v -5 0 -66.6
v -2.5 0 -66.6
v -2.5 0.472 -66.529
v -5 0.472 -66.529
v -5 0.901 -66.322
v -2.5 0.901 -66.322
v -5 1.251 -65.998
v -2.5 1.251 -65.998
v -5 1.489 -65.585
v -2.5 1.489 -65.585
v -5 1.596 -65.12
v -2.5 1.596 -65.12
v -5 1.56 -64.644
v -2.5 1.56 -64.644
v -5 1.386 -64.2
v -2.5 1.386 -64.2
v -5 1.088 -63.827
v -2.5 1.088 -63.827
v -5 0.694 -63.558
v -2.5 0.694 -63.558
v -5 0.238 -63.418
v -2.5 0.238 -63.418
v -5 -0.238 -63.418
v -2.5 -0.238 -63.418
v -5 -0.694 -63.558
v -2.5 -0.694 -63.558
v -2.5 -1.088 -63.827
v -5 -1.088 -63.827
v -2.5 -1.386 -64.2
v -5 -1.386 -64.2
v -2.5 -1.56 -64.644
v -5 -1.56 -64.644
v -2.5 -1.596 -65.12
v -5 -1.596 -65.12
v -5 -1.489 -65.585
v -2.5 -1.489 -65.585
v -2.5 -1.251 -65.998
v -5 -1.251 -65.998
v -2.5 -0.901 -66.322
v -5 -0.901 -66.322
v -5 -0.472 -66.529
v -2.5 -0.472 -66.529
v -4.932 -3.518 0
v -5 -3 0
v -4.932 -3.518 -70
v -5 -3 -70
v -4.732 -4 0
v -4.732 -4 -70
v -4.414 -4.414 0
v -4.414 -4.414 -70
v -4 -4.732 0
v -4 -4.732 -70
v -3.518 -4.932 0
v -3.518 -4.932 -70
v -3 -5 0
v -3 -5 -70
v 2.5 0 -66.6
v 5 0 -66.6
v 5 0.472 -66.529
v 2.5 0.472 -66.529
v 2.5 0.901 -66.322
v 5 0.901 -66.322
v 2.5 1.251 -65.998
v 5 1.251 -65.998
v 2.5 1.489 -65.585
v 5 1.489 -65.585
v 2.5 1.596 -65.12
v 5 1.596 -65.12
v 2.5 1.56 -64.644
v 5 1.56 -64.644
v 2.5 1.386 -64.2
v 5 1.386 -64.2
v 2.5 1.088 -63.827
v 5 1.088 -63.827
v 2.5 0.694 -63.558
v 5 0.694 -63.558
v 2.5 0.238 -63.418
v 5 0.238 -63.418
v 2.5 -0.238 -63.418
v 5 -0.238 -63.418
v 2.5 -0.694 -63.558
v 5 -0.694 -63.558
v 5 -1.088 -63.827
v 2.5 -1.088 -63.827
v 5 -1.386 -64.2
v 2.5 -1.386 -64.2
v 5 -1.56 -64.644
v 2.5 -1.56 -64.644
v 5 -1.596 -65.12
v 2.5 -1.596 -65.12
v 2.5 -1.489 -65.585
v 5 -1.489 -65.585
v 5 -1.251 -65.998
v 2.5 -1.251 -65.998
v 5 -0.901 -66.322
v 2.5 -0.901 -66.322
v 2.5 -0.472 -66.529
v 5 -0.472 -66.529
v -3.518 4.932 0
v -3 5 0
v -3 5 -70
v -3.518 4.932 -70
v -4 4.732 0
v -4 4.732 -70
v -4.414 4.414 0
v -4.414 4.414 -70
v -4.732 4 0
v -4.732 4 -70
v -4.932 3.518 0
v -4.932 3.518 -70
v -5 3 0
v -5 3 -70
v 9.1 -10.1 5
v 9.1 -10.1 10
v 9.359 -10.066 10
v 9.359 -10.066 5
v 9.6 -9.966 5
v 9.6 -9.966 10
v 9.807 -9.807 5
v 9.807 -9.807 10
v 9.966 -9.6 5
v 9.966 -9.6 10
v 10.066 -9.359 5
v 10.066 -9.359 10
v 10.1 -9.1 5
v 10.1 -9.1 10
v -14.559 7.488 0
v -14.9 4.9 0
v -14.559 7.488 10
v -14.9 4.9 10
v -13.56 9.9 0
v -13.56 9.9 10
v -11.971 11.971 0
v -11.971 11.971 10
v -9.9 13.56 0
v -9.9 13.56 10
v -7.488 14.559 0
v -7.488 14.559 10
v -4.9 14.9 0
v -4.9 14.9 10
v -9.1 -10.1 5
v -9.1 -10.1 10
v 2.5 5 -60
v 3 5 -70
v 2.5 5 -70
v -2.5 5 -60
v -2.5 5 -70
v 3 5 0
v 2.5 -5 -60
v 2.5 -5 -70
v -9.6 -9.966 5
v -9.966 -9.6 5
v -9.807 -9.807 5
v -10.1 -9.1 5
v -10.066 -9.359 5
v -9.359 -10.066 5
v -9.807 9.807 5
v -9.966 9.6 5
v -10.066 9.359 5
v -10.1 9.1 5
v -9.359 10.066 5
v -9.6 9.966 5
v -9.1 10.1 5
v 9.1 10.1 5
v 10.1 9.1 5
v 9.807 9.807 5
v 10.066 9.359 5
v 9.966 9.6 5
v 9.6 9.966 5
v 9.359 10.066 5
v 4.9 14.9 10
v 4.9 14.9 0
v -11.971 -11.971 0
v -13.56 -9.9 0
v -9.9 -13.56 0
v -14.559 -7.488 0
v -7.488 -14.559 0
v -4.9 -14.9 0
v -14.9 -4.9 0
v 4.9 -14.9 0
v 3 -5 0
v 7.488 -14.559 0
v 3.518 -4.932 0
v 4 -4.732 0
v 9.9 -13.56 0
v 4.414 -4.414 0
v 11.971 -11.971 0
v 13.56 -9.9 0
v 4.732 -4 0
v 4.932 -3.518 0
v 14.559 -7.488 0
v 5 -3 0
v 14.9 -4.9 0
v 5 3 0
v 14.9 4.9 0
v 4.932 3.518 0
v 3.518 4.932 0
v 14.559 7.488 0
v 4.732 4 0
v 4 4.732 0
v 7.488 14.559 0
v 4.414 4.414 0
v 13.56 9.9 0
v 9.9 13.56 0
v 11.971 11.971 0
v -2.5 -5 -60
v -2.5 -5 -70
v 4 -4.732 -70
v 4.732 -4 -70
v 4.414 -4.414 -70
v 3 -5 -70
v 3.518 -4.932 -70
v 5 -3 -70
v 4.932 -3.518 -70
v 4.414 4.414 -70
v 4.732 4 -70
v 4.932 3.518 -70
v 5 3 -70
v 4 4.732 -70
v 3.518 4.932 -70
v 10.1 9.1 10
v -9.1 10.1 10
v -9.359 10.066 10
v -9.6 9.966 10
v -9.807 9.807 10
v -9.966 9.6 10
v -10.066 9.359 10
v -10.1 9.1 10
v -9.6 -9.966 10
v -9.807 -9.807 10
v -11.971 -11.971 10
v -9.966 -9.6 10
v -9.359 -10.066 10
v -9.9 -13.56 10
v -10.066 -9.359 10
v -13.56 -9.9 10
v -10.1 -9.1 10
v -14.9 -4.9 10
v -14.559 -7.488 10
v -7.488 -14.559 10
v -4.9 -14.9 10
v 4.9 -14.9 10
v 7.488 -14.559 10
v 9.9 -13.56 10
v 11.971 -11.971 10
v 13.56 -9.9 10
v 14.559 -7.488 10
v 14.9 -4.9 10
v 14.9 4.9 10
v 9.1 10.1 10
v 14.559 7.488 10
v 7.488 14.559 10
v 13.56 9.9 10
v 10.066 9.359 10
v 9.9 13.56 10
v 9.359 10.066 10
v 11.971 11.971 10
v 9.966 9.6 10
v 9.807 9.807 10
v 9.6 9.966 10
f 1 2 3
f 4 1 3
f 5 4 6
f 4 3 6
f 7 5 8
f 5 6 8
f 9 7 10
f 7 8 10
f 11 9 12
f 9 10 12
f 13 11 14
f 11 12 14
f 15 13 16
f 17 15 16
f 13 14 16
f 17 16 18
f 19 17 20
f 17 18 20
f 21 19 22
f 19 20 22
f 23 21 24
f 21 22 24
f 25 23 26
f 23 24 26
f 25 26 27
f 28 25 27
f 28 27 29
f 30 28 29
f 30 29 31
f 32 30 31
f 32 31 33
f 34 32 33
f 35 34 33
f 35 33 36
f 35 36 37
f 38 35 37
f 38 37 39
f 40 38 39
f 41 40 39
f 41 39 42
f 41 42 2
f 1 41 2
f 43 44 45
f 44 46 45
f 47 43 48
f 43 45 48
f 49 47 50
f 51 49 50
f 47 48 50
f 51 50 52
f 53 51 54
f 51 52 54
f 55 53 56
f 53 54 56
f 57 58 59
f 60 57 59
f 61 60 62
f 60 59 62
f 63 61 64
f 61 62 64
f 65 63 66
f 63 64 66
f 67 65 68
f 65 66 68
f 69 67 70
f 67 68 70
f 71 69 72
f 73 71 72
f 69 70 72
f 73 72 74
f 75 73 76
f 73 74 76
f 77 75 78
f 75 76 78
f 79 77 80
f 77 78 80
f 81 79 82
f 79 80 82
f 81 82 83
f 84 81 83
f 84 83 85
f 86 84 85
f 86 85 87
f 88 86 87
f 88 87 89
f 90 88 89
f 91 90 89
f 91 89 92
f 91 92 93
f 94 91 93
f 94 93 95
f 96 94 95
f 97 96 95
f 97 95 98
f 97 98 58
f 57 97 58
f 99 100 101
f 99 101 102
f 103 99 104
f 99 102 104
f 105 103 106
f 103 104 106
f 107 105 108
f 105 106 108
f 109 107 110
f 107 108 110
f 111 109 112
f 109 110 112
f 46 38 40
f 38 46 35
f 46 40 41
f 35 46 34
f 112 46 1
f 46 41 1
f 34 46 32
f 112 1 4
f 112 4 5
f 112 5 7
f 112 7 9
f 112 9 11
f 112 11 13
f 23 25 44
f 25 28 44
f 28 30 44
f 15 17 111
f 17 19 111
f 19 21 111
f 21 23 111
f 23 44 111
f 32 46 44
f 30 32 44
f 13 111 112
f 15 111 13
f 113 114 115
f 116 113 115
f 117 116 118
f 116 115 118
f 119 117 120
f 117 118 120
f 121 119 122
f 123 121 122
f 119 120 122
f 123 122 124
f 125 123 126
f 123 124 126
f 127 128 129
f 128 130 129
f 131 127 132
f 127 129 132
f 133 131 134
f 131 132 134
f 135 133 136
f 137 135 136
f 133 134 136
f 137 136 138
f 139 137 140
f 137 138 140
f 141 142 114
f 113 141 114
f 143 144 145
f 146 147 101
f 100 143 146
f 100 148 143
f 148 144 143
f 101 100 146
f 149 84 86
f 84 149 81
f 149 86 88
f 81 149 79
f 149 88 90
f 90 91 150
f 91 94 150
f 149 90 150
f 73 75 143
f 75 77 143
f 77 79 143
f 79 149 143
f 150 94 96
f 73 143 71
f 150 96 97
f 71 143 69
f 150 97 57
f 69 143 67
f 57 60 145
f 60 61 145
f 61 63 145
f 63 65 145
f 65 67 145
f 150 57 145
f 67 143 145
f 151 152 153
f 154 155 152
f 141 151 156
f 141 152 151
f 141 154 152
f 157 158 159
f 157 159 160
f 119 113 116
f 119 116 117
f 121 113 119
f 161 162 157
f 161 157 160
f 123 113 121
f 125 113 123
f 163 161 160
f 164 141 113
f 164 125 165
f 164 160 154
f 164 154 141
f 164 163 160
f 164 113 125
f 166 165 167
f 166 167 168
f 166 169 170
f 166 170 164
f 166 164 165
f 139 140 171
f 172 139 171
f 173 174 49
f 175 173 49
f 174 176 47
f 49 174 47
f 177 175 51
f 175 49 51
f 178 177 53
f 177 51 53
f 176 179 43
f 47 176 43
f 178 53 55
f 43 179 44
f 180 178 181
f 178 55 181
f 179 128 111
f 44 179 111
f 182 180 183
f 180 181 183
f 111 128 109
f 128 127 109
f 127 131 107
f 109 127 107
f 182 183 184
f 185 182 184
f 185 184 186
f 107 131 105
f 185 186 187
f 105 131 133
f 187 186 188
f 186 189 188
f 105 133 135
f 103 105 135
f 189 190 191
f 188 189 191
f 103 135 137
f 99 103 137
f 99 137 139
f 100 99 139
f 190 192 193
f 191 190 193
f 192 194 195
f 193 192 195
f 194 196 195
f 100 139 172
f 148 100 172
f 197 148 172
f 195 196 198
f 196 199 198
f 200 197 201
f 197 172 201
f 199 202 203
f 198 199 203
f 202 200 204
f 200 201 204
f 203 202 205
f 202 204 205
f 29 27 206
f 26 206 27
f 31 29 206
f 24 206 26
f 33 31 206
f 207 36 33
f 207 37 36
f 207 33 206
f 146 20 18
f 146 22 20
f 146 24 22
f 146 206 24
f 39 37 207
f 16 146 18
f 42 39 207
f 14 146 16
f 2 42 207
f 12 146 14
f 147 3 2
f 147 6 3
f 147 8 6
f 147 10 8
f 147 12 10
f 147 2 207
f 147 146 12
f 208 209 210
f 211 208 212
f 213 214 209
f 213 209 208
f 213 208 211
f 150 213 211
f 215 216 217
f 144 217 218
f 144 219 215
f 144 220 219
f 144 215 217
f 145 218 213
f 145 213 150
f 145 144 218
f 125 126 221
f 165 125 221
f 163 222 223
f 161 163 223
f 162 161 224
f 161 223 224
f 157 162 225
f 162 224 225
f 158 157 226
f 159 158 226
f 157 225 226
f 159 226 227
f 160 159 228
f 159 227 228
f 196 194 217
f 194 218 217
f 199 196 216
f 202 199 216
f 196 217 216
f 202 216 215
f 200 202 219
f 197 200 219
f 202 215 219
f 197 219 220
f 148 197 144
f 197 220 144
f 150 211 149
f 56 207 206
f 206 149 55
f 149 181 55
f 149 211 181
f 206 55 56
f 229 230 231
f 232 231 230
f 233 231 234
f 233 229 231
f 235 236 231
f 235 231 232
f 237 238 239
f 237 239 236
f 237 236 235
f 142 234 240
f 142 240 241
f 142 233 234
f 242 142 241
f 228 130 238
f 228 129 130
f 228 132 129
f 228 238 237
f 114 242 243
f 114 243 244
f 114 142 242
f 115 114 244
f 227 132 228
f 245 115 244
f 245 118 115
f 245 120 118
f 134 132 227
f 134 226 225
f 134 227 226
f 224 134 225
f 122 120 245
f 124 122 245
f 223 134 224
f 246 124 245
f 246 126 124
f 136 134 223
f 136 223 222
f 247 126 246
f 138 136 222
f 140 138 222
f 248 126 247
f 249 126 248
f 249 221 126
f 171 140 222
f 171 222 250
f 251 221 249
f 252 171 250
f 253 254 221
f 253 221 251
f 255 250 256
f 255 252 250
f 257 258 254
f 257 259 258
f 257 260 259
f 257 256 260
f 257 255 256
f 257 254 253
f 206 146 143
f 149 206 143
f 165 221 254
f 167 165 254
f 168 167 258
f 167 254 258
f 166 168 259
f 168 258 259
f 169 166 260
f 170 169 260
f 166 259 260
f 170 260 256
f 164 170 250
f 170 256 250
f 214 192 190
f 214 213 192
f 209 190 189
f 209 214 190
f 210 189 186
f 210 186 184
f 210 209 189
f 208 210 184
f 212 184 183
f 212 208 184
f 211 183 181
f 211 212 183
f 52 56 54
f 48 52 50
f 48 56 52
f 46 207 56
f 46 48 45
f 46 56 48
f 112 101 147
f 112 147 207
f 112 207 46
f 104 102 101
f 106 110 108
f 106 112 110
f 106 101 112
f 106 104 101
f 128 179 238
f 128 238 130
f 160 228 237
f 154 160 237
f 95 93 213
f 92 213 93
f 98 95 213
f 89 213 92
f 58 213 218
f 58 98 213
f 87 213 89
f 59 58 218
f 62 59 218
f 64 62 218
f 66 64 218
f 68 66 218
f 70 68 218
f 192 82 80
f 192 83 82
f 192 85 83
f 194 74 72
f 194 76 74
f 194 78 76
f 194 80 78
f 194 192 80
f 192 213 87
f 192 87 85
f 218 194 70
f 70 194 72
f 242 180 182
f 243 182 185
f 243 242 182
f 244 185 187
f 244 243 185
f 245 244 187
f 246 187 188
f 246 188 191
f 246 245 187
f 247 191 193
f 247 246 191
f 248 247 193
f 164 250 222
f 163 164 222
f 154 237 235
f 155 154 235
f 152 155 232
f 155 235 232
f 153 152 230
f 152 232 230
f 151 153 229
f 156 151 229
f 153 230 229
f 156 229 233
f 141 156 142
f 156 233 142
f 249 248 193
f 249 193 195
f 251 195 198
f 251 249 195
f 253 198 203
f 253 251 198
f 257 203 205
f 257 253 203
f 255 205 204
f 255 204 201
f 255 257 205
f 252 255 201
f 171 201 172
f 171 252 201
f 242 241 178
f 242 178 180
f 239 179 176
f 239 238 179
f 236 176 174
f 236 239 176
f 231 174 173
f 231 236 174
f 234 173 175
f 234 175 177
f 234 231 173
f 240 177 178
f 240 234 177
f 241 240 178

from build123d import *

# Parameters (mm, degrees)
SKETCH_1_W          = 29.8
SKETCH_1_H          = 29.8
EXTRUDE_1_DEPTH     = 10
FILLET_1_R          = 10
SKETCH_2_W          = 10
SKETCH_2_H          = 10
EXTRUDE_2_DEPTH     = 70
SKETCH_3_W          = 5
SKETCH_3_H          = 10
CUT_EXTRUDE_1_DEPTH = 75.283376337
SKETCH_4_R          = 1.6
CUT_EXTRUDE_2_DEPTH = 75.283376337
CUT_EXTRUDE_3_DEPTH = 5
FILLET_3_R          = 2


with BuildPart() as part:
    # ｽｹｯﾁ1 → ﾎﾞｽ - 押し出し1 (new body)
    with BuildSketch(Plane.XY):
        Rectangle(SKETCH_1_W, SKETCH_1_H)
    extrude(amount=EXTRUDE_1_DEPTH)

    # ﾌｨﾚｯﾄ1
    fillet_1_edges = [part.edges().sort_by_distance(p)[0] for p in [
        (-14.9, -14.9, 5),
        (14.9, -14.9, 5),
        (14.9, 14.9, 5),
        (-14.9, 14.9, 5),
    ]]
    fillet(fillet_1_edges, radius=FILLET_1_R)

    # ｽｹｯﾁ2 → ﾎﾞｽ - 押し出し2 (add)
    with BuildSketch(Plane(origin=(0, 0, 0), x_dir=(-1, 0, 0), z_dir=(0, 0, -1))):
        Rectangle(SKETCH_2_W, SKETCH_2_H)
    extrude(amount=EXTRUDE_2_DEPTH)

    # ｽｹｯﾁ3 → ｶｯﾄ - 押し出し1 (cut, through all)
    with BuildSketch(Plane(origin=(0, 5, 0), x_dir=(1, 0, 0), z_dir=(0, 1, 0))):
        with Locations((0, 65)):
            Rectangle(SKETCH_3_W, SKETCH_3_H)
    extrude(amount=-CUT_EXTRUDE_1_DEPTH, mode=Mode.SUBTRACT)

    # ｽｹｯﾁ4 → ｶｯﾄ - 押し出し2 (cut, through all)
    with BuildSketch(Plane(origin=(5, 0, 0), x_dir=(0, 0, -1), z_dir=(1, 0, 0))):
        with Locations((65, 0)):
            Circle(SKETCH_4_R)
    extrude(amount=-CUT_EXTRUDE_2_DEPTH, mode=Mode.SUBTRACT)

    # ｽｹｯﾁ5 → ｶｯﾄ - 押し出し3 (cut)
    with BuildSketch(Plane.XY.offset(10)):
        with BuildLine():
            Line((-9.1, -10.1), (9.1, -10.1))
            ThreePointArc((9.1, -10.1), (9.807106781, -9.807106781), (10.1, -9.1))
            Line((10.1, -9.1), (10.1, 9.1))
            ThreePointArc((10.1, 9.1), (9.807106781, 9.807106781), (9.1, 10.1))
            Line((9.1, 10.1), (-9.1, 10.1))
            ThreePointArc((-9.1, 10.1), (-9.807106781, 9.807106781), (-10.1, 9.1))
            Line((-10.1, 9.1), (-10.1, -9.1))
            ThreePointArc((-10.1, -9.1), (-9.807106781, -9.807106781), (-9.1, -10.1))
        make_face()
    extrude(amount=-CUT_EXTRUDE_3_DEPTH, mode=Mode.SUBTRACT)

    # ﾌｨﾚｯﾄ3
    fillet_3_edges = [part.edges().sort_by_distance(p)[0] for p in [
        (-5, -5, -35),
        (-5, 5, -35),
        (5, 5, -35),
        (5, -5, -35),
    ]]
    fillet(fillet_3_edges, radius=FILLET_3_R)


solid = part.part
